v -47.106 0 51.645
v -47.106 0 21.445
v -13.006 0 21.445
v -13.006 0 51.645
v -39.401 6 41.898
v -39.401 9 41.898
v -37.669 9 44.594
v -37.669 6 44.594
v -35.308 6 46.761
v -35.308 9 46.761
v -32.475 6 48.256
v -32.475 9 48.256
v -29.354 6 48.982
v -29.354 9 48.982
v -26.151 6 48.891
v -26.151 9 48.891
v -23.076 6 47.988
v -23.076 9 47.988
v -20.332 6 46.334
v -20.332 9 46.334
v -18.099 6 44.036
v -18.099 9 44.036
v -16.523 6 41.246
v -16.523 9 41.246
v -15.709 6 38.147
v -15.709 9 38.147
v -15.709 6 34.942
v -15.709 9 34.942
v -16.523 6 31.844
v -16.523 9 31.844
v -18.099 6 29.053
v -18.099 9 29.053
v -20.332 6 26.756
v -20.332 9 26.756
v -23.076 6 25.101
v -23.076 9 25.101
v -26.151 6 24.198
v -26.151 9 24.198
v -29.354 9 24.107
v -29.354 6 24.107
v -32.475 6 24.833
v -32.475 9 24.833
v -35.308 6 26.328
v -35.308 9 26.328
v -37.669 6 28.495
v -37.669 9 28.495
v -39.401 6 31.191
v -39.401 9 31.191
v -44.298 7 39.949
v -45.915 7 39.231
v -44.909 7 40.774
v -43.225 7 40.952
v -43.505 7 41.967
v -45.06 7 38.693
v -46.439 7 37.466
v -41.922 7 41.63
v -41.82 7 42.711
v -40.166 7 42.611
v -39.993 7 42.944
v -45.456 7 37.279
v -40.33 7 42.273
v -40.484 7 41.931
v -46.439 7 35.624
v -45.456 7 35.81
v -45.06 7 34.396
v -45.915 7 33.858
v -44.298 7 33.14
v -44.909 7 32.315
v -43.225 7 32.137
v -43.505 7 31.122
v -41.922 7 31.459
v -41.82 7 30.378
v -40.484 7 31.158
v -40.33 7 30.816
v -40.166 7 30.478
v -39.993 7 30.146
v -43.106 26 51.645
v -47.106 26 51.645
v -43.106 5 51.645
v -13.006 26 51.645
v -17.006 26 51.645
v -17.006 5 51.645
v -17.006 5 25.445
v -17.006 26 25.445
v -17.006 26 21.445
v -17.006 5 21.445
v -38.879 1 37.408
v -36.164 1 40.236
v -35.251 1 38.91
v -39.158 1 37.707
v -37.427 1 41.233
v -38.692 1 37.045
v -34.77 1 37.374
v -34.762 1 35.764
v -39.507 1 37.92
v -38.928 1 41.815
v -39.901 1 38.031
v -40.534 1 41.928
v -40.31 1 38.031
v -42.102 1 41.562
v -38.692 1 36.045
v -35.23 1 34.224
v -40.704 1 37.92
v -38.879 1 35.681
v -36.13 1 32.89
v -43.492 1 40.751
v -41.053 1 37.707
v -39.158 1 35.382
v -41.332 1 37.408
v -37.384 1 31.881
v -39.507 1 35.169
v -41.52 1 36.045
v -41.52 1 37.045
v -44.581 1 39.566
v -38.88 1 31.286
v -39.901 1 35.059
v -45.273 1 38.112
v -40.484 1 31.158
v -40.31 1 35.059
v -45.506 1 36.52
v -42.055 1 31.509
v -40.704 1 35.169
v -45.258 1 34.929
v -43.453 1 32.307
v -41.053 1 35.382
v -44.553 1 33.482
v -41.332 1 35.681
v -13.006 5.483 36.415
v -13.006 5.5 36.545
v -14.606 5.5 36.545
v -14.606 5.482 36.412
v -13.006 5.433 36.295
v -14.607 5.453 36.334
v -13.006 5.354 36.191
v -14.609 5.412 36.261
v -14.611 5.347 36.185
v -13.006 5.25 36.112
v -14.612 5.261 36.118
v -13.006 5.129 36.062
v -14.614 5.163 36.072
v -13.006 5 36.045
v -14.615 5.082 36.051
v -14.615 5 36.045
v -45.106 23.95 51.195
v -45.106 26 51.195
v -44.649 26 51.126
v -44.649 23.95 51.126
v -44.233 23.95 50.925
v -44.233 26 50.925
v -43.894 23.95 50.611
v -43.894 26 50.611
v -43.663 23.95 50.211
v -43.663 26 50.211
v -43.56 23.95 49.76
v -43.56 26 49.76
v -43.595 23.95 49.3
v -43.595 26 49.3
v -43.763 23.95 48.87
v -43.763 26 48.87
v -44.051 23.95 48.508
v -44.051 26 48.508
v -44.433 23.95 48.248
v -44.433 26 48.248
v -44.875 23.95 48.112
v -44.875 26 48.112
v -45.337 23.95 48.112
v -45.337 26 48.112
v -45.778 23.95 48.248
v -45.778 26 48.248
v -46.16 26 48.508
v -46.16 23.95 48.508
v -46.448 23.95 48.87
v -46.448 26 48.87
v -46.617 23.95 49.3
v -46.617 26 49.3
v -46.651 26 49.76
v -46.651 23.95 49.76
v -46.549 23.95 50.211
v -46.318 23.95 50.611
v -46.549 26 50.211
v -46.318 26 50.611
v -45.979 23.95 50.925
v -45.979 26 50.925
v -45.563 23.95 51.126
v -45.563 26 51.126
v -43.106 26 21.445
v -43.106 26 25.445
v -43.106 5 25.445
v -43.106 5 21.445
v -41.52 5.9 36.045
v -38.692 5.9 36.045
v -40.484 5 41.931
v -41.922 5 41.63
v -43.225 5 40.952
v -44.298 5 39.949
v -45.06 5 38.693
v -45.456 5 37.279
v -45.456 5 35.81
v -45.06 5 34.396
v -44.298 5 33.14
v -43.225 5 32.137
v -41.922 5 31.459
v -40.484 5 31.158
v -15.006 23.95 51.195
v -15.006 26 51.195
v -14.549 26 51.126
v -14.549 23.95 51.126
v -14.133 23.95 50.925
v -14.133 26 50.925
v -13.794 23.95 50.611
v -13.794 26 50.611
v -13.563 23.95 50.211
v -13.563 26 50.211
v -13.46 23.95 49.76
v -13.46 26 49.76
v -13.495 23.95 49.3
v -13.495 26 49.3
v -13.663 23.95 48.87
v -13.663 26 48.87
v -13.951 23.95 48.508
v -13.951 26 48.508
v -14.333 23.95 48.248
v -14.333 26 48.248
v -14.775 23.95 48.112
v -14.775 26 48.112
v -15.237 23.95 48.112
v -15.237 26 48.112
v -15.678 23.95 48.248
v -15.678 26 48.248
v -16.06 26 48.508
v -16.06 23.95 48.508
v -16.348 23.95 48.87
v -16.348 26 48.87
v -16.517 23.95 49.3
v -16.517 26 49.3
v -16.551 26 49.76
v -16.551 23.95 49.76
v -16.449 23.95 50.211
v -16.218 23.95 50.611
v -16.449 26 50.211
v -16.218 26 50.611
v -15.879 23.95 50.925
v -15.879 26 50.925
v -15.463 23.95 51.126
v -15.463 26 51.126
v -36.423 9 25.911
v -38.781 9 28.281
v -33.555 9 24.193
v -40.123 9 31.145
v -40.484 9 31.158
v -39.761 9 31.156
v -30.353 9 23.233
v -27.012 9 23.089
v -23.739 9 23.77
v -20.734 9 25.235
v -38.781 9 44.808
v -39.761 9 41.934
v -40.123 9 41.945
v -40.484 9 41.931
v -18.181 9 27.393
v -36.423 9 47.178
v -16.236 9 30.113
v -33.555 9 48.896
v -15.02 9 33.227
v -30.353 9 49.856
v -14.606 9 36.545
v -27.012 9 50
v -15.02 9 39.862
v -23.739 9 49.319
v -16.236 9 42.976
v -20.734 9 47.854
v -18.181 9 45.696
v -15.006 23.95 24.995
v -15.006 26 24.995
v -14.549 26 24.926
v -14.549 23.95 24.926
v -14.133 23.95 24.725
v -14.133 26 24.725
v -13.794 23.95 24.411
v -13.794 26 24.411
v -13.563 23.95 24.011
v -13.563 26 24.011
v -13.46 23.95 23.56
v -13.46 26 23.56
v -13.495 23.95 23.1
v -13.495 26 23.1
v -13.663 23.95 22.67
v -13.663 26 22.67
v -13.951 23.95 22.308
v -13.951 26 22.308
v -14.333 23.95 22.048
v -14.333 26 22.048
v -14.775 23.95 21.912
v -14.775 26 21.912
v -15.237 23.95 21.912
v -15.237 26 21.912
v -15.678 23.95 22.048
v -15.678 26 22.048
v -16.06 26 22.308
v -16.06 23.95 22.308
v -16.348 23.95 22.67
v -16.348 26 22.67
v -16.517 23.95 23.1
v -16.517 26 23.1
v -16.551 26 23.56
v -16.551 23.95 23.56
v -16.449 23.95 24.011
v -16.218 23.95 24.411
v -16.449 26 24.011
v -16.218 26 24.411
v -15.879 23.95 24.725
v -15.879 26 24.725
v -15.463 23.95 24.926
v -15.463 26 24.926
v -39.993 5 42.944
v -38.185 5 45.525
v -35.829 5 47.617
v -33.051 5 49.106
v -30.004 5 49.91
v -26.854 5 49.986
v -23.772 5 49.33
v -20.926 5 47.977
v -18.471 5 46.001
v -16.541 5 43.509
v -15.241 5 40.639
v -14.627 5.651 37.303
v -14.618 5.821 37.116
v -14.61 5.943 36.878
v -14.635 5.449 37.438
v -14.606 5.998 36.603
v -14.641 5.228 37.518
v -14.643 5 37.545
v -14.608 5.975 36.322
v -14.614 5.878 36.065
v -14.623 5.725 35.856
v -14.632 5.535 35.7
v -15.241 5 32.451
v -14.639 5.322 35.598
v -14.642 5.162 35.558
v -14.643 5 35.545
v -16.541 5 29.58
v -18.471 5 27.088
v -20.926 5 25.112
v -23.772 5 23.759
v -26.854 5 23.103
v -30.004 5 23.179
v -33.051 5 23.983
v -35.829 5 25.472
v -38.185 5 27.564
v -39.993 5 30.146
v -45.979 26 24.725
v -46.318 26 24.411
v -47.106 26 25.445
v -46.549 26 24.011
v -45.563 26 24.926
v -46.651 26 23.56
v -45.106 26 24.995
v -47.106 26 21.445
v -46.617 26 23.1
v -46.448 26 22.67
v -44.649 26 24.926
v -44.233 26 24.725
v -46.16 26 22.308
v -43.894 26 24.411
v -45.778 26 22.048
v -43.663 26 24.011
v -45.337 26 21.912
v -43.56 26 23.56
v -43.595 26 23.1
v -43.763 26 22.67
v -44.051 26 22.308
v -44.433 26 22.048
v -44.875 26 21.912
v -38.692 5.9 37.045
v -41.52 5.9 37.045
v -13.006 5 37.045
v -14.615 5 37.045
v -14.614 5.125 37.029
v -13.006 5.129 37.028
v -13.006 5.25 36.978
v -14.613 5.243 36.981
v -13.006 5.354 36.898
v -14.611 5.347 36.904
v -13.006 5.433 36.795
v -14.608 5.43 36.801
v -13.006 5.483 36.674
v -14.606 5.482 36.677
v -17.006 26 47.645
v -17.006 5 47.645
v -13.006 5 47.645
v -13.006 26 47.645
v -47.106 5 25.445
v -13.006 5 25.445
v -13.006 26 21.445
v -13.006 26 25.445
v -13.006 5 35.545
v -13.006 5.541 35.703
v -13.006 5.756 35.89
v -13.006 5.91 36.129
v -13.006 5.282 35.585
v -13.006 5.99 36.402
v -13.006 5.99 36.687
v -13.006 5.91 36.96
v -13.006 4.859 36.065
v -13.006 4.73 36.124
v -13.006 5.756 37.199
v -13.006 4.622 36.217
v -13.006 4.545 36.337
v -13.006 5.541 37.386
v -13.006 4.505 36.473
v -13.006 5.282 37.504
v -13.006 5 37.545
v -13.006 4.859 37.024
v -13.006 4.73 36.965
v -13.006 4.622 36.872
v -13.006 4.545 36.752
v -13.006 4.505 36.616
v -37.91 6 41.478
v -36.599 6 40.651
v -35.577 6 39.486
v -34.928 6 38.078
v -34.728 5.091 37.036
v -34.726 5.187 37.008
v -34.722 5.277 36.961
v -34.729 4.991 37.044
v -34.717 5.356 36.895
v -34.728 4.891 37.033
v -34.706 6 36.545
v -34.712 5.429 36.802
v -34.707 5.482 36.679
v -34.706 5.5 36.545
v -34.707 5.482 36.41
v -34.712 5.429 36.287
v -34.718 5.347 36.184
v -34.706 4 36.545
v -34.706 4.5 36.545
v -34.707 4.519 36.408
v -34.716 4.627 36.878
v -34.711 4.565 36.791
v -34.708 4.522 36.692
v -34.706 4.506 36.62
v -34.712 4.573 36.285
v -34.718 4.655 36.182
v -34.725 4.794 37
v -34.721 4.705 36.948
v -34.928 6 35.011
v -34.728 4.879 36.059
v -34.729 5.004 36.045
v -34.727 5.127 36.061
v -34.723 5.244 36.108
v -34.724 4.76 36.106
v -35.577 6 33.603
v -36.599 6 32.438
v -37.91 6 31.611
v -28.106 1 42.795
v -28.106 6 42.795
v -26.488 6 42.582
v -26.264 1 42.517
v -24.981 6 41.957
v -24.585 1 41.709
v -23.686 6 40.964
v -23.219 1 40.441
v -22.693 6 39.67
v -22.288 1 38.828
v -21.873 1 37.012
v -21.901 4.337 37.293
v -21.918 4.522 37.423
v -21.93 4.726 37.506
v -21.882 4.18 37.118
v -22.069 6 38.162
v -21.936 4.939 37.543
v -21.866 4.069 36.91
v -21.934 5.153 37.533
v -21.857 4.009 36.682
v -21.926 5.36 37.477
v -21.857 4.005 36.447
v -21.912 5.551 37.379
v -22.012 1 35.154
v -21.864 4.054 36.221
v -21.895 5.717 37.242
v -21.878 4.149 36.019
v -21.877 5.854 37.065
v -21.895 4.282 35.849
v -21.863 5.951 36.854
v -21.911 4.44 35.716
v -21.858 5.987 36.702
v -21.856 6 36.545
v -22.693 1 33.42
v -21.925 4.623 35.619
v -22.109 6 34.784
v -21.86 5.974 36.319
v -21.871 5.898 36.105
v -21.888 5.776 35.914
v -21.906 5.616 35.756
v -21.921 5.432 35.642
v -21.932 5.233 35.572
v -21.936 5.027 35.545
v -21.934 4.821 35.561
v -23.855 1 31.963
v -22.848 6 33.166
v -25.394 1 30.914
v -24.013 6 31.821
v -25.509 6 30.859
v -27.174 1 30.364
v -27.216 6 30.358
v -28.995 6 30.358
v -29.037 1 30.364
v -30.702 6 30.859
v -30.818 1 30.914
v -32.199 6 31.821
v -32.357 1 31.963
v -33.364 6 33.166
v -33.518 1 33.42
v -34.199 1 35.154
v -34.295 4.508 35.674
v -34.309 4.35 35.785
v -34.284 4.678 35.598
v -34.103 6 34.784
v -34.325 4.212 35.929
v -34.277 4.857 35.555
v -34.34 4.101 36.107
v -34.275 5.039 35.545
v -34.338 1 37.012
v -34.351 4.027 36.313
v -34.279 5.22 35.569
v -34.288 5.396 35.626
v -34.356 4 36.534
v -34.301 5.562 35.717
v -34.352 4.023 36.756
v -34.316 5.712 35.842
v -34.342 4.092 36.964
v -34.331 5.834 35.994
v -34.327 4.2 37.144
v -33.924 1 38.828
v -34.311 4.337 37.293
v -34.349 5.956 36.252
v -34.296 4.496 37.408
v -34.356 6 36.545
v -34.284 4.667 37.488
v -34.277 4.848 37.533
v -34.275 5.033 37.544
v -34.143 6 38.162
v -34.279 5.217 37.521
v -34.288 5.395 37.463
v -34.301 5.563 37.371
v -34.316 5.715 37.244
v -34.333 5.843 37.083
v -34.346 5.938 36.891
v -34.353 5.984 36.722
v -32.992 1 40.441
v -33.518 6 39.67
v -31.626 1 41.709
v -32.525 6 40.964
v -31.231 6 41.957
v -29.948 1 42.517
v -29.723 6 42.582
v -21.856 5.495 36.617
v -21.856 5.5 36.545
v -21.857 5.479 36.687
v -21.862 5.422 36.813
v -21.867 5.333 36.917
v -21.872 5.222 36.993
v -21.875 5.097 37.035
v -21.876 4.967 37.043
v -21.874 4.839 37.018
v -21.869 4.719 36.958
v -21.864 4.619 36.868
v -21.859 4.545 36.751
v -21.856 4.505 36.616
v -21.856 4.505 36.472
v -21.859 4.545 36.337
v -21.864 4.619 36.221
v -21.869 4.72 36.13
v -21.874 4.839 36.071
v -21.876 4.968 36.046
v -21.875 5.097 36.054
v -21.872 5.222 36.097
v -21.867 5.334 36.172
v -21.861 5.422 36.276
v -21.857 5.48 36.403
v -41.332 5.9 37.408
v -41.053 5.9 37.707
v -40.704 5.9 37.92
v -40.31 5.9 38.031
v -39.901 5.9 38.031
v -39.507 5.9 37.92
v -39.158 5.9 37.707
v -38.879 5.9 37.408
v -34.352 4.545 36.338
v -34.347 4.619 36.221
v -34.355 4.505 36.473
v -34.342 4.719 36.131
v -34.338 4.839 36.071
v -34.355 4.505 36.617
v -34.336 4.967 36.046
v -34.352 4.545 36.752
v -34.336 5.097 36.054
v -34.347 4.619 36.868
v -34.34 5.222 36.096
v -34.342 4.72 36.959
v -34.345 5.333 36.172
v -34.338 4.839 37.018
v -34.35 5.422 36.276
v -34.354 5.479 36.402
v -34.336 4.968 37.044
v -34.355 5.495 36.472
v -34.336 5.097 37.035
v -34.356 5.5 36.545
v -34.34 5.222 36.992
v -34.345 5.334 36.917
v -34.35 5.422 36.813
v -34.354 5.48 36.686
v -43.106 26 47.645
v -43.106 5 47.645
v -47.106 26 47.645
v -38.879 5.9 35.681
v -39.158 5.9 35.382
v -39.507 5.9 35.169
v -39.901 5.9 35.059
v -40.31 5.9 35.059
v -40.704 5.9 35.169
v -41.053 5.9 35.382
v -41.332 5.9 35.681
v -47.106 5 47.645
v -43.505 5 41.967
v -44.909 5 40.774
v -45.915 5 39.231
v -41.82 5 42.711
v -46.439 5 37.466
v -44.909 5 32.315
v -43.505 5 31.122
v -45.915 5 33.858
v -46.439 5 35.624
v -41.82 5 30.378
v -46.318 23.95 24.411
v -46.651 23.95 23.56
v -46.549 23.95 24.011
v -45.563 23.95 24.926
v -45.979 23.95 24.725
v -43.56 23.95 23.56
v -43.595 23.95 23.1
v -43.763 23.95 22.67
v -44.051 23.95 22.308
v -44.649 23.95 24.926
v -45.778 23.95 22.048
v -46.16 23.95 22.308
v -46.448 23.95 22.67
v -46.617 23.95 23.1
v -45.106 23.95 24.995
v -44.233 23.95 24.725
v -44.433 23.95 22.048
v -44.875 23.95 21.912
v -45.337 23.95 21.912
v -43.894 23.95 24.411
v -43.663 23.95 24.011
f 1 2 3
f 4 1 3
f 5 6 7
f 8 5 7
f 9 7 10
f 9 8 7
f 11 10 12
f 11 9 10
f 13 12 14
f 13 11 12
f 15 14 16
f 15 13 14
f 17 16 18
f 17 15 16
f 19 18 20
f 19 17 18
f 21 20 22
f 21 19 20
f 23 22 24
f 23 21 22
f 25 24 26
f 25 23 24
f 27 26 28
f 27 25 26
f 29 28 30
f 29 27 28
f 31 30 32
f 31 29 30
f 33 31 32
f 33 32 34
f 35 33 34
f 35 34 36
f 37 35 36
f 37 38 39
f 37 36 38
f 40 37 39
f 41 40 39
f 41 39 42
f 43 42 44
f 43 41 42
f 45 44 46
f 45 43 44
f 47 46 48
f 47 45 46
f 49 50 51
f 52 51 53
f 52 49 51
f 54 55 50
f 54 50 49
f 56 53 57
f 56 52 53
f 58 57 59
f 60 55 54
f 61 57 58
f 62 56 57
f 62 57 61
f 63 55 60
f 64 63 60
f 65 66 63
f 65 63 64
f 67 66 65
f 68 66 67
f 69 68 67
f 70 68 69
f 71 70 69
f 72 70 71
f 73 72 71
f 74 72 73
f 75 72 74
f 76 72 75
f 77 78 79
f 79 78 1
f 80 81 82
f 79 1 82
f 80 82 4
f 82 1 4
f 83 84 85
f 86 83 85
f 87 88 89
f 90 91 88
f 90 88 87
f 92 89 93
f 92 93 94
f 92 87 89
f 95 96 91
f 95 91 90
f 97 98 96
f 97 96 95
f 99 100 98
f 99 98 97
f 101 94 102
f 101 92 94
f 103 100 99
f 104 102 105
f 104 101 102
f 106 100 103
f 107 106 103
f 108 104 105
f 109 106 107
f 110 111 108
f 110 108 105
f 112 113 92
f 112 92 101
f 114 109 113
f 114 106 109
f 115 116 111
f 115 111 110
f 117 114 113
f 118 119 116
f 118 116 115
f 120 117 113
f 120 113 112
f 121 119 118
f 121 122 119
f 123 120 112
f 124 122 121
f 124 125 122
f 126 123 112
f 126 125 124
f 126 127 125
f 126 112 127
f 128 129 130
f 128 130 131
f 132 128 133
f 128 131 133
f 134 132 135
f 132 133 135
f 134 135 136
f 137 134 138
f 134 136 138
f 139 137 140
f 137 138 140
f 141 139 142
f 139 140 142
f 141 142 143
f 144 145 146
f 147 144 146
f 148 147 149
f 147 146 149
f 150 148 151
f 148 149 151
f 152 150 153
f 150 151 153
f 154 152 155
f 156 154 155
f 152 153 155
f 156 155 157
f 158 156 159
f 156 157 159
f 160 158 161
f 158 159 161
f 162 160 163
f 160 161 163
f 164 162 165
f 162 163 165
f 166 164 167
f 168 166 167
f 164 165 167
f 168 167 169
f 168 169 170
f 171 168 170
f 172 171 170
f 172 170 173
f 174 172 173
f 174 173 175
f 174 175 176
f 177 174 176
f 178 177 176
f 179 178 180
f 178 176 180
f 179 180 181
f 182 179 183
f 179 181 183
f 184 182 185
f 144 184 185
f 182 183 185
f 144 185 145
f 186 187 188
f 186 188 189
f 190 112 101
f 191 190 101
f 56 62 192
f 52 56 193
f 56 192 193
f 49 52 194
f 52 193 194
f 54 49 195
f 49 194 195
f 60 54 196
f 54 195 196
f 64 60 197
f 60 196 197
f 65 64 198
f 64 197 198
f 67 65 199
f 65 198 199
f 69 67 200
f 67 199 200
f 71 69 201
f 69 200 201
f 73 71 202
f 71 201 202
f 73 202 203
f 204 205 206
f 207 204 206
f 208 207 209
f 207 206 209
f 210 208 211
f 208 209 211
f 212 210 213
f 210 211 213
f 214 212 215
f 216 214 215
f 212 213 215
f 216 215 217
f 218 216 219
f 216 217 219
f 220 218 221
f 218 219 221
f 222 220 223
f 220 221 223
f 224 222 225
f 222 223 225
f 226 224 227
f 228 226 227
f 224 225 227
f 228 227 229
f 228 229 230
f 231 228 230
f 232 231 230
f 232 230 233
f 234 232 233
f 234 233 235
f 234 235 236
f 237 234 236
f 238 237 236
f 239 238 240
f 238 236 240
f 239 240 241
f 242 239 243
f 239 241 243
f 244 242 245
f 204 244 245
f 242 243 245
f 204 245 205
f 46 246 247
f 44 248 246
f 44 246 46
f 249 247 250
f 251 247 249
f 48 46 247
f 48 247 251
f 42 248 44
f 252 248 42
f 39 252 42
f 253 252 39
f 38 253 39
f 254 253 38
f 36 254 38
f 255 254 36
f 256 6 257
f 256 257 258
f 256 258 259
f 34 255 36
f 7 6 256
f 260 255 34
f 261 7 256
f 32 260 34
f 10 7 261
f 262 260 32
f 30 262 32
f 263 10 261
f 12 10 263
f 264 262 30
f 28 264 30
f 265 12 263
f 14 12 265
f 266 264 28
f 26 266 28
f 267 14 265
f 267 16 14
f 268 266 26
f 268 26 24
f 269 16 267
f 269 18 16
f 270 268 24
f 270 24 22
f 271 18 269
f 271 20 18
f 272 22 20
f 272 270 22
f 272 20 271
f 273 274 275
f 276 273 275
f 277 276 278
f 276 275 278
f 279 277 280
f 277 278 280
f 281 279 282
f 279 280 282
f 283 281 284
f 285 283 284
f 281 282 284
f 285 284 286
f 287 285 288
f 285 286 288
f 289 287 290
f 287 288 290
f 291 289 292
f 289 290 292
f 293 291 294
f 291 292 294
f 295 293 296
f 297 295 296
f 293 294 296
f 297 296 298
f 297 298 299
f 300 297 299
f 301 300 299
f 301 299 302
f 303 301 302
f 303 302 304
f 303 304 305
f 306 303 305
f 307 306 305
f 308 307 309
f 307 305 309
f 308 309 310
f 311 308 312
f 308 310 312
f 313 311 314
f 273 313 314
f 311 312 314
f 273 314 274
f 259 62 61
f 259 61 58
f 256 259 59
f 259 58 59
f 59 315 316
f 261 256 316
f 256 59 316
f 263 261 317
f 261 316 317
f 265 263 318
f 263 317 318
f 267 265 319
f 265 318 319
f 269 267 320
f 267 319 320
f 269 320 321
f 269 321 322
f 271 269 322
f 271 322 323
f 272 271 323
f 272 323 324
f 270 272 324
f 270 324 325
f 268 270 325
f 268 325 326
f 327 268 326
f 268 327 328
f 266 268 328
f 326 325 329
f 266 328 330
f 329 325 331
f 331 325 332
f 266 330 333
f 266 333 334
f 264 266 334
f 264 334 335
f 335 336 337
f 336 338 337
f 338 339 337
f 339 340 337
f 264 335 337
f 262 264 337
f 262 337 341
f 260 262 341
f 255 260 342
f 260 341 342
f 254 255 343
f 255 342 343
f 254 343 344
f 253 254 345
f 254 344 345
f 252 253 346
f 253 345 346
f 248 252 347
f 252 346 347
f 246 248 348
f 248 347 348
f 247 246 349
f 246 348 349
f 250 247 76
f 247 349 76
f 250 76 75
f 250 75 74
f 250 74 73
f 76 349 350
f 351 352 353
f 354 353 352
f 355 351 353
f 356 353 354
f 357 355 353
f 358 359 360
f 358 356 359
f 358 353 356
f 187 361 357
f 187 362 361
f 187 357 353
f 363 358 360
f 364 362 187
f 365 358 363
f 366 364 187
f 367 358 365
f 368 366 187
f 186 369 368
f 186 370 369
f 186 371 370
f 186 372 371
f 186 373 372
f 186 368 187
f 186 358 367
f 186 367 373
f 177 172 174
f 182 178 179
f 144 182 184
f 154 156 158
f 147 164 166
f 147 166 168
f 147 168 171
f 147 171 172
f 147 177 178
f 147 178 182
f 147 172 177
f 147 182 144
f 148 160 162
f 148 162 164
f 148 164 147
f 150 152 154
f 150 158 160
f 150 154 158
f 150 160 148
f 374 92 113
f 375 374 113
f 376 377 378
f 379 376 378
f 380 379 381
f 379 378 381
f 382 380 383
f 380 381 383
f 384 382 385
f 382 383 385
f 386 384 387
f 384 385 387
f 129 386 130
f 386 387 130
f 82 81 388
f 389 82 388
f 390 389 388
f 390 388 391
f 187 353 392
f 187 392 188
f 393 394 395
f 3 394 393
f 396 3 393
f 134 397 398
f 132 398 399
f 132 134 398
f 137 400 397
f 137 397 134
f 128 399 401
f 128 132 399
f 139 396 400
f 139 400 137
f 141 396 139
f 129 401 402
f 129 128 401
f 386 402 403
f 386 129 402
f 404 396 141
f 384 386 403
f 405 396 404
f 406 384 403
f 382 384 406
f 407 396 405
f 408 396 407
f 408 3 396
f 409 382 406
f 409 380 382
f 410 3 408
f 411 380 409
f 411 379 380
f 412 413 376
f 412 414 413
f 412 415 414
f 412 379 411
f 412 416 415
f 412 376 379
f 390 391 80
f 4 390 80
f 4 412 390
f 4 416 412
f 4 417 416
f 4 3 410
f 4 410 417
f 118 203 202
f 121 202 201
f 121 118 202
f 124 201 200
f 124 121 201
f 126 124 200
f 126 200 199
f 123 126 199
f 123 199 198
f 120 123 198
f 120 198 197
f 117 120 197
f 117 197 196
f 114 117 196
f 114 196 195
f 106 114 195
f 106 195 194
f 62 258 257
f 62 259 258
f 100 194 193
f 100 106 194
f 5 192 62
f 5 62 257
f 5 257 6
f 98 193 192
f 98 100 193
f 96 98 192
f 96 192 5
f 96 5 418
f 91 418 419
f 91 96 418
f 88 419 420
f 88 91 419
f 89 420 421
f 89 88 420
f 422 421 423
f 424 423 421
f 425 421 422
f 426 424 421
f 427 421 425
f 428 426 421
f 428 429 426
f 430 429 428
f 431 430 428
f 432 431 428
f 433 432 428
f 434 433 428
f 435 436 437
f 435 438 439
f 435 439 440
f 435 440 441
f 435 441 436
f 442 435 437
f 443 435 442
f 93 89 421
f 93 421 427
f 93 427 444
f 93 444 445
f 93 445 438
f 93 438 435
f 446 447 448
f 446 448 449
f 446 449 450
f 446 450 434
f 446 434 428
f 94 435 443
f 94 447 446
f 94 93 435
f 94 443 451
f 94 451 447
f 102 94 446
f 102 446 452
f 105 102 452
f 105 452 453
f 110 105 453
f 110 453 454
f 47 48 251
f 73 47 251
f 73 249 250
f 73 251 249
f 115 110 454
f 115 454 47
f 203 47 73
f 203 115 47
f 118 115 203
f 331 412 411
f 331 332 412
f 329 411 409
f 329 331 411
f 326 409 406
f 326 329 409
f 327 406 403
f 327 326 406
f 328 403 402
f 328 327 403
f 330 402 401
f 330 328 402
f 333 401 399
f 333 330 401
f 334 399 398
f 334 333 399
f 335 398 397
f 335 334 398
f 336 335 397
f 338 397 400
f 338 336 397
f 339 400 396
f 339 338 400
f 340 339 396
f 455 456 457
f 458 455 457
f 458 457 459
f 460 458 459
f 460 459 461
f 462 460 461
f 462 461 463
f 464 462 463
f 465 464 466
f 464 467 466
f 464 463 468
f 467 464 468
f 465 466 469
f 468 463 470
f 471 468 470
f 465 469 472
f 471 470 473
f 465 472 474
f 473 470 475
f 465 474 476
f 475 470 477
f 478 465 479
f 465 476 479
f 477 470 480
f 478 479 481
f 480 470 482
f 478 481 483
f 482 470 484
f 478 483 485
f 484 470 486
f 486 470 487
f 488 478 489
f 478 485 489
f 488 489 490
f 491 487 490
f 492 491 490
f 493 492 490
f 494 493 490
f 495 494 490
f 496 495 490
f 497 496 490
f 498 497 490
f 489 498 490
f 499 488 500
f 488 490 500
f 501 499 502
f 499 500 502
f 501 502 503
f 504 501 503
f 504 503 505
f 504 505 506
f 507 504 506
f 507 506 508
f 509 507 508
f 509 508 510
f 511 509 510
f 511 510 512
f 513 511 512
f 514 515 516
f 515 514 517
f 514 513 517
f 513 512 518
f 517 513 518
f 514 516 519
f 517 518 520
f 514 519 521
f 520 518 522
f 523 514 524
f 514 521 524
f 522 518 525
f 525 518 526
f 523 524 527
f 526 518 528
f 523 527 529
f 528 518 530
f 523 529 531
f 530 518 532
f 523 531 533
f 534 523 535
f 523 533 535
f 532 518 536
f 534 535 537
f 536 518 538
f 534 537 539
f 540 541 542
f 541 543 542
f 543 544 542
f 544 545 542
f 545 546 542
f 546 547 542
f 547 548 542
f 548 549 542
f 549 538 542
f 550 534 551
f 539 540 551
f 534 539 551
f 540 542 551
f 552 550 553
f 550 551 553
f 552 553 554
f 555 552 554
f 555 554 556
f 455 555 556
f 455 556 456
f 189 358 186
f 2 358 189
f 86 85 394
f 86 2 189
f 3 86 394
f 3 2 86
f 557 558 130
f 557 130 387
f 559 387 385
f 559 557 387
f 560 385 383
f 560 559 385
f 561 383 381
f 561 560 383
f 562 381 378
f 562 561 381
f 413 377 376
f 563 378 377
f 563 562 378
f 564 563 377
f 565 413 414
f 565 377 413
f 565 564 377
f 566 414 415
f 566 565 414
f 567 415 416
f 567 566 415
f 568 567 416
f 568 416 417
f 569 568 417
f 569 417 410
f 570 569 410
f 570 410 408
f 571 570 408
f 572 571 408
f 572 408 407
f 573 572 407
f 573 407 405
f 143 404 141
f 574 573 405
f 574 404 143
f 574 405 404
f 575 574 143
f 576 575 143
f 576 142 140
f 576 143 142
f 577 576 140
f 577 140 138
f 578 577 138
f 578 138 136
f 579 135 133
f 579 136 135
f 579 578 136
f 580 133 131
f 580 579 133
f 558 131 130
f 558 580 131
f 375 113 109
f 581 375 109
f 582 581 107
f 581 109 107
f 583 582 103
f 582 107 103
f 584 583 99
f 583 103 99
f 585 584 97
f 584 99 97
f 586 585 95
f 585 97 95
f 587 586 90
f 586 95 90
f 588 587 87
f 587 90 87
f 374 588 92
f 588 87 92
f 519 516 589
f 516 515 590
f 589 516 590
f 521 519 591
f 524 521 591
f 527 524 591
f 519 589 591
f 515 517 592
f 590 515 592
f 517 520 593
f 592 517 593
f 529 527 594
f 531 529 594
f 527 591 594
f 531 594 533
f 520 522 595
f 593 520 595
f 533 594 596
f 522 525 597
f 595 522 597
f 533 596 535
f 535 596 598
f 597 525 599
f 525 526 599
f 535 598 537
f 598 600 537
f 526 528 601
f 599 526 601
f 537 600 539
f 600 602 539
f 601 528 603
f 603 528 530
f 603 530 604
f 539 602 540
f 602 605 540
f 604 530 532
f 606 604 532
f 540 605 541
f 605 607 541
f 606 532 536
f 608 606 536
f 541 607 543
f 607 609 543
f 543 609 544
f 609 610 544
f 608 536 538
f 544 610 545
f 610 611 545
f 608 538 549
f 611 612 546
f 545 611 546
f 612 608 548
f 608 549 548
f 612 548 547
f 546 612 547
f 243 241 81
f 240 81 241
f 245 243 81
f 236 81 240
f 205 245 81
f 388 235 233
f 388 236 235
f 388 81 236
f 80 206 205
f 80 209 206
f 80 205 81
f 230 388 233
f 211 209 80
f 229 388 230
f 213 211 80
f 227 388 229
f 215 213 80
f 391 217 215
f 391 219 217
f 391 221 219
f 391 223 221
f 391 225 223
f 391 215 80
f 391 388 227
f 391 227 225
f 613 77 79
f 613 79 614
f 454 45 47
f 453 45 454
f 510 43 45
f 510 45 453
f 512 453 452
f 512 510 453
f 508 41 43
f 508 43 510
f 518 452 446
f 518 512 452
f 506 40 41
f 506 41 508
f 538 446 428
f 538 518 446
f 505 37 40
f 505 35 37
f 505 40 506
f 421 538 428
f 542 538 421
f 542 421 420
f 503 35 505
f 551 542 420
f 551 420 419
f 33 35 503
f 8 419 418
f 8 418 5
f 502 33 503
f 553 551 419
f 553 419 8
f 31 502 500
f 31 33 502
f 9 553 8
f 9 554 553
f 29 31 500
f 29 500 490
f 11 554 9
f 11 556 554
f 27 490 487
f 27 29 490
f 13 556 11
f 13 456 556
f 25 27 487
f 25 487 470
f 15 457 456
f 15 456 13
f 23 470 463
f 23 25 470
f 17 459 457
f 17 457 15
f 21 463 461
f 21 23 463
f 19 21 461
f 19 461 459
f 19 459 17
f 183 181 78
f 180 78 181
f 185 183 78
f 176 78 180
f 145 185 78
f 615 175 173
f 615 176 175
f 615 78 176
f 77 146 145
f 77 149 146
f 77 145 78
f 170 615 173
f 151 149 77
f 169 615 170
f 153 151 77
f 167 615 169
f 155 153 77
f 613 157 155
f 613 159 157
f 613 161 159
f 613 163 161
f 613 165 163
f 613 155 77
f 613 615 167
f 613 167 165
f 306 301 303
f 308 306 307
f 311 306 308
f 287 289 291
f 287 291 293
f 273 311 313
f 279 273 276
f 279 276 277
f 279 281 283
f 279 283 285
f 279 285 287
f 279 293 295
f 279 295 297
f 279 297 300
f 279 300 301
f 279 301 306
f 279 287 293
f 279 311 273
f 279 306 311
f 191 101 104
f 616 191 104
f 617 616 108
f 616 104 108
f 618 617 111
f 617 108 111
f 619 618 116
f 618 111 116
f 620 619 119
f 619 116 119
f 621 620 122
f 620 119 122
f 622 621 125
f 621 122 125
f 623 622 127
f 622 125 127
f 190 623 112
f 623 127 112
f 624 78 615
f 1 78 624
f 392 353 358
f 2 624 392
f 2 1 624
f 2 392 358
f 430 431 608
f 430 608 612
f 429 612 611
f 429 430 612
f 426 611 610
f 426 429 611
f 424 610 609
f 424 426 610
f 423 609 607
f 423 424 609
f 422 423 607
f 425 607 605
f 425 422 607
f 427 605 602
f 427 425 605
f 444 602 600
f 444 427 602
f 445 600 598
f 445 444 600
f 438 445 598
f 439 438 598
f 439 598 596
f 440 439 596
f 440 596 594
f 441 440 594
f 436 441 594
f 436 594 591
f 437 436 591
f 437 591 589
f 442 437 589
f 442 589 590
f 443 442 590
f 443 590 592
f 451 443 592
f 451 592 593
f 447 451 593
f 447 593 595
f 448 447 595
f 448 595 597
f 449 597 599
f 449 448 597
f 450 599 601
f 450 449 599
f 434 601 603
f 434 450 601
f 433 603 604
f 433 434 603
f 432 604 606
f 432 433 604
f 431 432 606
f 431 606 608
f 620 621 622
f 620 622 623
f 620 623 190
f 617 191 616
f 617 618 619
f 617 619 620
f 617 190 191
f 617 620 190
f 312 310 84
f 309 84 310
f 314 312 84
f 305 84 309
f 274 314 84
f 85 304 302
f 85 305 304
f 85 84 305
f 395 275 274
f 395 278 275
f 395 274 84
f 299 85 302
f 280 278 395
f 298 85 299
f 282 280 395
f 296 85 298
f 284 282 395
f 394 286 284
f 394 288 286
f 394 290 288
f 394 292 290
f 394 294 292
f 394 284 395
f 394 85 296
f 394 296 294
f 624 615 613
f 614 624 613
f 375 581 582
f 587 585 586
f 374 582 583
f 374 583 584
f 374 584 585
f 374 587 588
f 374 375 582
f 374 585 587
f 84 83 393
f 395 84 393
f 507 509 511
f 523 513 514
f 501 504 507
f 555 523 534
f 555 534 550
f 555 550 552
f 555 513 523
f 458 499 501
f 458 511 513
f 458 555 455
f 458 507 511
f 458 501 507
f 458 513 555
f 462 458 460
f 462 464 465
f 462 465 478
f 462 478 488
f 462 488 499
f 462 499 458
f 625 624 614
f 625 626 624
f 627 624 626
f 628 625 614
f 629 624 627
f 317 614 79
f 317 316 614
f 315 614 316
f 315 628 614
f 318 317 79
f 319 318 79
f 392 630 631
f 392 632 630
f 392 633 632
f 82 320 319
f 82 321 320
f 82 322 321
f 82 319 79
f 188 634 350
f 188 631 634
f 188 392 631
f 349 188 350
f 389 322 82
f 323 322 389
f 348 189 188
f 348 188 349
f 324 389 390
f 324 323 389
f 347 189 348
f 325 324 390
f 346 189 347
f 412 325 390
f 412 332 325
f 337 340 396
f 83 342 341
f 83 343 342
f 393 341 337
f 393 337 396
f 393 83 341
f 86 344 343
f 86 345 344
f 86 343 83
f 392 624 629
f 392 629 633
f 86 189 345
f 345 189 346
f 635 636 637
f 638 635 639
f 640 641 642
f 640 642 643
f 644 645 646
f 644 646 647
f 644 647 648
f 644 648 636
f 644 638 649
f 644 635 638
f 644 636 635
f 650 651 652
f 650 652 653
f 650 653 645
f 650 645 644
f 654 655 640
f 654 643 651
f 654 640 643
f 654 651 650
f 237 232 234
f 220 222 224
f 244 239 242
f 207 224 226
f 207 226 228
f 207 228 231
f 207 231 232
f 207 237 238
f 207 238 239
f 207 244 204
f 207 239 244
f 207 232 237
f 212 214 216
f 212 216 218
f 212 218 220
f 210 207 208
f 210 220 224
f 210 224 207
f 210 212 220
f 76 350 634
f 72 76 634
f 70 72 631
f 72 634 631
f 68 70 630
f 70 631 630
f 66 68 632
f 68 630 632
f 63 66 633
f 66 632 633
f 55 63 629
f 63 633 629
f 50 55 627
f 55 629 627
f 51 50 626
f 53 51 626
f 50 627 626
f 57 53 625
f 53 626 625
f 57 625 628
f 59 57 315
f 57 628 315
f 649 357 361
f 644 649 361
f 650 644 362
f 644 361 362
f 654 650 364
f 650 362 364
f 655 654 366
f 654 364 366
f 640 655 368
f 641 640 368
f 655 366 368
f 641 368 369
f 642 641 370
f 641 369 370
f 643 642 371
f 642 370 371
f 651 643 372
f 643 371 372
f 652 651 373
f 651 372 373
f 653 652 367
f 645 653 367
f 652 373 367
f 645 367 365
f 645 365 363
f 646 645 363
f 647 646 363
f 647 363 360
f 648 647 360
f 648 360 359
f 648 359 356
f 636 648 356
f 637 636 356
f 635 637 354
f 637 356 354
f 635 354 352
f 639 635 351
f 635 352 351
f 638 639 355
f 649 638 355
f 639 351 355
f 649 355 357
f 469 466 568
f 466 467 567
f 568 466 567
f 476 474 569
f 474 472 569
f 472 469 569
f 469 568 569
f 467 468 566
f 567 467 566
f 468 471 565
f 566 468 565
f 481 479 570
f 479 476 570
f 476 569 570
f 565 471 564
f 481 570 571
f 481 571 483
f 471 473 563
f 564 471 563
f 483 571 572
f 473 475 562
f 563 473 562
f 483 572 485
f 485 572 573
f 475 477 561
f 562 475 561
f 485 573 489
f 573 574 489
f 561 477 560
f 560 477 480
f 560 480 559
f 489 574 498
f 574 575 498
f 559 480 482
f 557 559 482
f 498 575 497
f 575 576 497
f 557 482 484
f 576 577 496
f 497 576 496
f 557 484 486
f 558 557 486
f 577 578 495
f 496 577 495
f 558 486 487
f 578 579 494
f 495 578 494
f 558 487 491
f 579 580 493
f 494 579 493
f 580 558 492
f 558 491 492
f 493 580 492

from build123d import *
from build123d.topology import SkipClean

# Parameters (mm, degrees)
SKETCH1_W               = 34.1
SKETCH1_H               = 30.2
BOSS_EXTRUDE1_DEPTH     = 5
SKETCH2_R               = 13.5
BOSS_EXTRUDE2_DEPTH     = 1
SKETCH3_R               = 13.5
SKETCH3_R_2             = 12.5
BOSS_EXTRUDE3_DEPTH     = 3
SKETCH4_R               = 6.25
CUT_EXTRUDE2_DEPTH      = 5
CUT_EXTRUDE3_DEPTH      = 5
CUT_EXTRUDE3_DEPTH_BACK = 5
SKETCH6_R               = 5.4
BOSS_EXTRUDE4_DEPTH     = 2
BOSS_EXTRUDE5_DEPTH     = 4.9
SKETCH10_R              = 1
SKETCH10_R_2            = 0.5
CUT_SWEEP1_START        = -34.728938274
CUT_SWEEP1_OUTLINE_R    = 0.5
CUT_SWEEP1_DEPTH        = 21.723198077
CUT_EXTRUDE4_START      = 5
SKETCH13_R              = 6.25
CUT_EXTRUDE4_DEPTH      = 5
SKETCH14_W              = 4
SKETCH14_H              = 4
BOSS_EXTRUDE6_DEPTH     = 21
SKETCH15_R              = 1.55
CUT_EXTRUDE5_DEPTH      = 2.05


# Read off the part's stored shape, not the designer's step: Cut-Sweep1
with BuildPart() as part:
    # Sketch1 → Boss-Extrude1 (new body)
    with BuildSketch(Plane(origin=(0, 0, 0), x_dir=(1, 0, 0), z_dir=(0, 1, 0))):
        with Locations((-30.055740197, -36.544574539)):
            Rectangle(SKETCH1_W, SKETCH1_H)
    extrude(amount=BOSS_EXTRUDE1_DEPTH)

    # Sketch2 → Boss-Extrude2 (add)
    with BuildSketch(Plane(origin=(0, 5, 0), x_dir=(1, 0, 0), z_dir=(0, 1, 0))):
        with Locations(Location((-28.105740197, -36.544574539, 0), (0, 0, 270))):
            Circle(SKETCH2_R)
    extrude(amount=BOSS_EXTRUDE2_DEPTH)

    # Sketch3 → Boss-Extrude3 (add)
    with BuildSketch(Plane(origin=(0, 6, 0), x_dir=(1, 0, 0), z_dir=(0, 1, 0))):
        with Locations(Location((-28.105740197, -36.544574539, 0), (0, 0, 270))):
            Circle(SKETCH3_R)
        with Locations(Location((-28.105740197, -36.544574539, 0), (0, 0, 270))):
            Circle(SKETCH3_R_2, mode=Mode.SUBTRACT)
    extrude(amount=BOSS_EXTRUDE3_DEPTH)

    # Sketch4 → Cut-Extrude2 (cut)
    with BuildSketch(Plane(origin=(0, 6, 0), x_dir=(1, 0, 0), z_dir=(0, 1, 0))):
        with Locations(Location((-28.105740197, -36.544574539, 0), (0, 0, 270))):
            Circle(SKETCH4_R)
    extrude(amount=-CUT_EXTRUDE2_DEPTH, mode=Mode.SUBTRACT)

    # Sketch6 → Cut-Extrude3 (cut, two sides: drawn at the far end of the back side and taken through both)
    with BuildSketch(Plane(origin=(0, 6, 0), x_dir=(1, 0, 0), z_dir=(0, 1, 0)).offset(-CUT_EXTRUDE3_DEPTH_BACK)):
        with Locations(Location((-40.105740197, -36.544574539, 0), (0, 0, 94.021964573))):
            Circle(SKETCH6_R)
    extrude(amount=CUT_EXTRUDE3_DEPTH + CUT_EXTRUDE3_DEPTH_BACK, mode=Mode.SUBTRACT)

    # Sketch7 → Boss-Extrude4 (add)
    with BuildSketch(Plane(origin=(0, 5, 0), x_dir=(1, 0, 0), z_dir=(0, 1, 0))):
        with BuildLine():
            ThreePointArc((-40.484490197, -41.931275611), (-45.505740197, -36.544574539), (-40.484490197, -31.157873467))
            ThreePointArc((-40.484490197, -31.157873467), (-40.249209884, -30.646596585), (-39.99282353, -30.145570724))
            ThreePointArc((-39.99282353, -30.145570724), (-46.505740197, -36.544574539), (-39.99282353, -42.943578354))
            ThreePointArc((-39.99282353, -42.943578354), (-40.249209884, -42.442552493), (-40.484490197, -41.931275611))
        make_face()
    extrude(amount=BOSS_EXTRUDE4_DEPTH)

    # Sketch9 → Boss-Extrude5 (add)
    with BuildSketch(Plane(origin=(0, 1, 0), x_dir=(1, 0, 0), z_dir=(0, 1, 0))):
        with BuildLine():
            Line((-38.691526635, -37.044574539), (-41.519953759, -37.044574539))
            ThreePointArc((-41.519953759, -37.044574539), (-40.105740197, -38.044574539), (-38.691526635, -37.044574539))
        make_face()
        with BuildLine():
            ThreePointArc((-38.691526635, -36.044574539), (-40.105740197, -35.044574539), (-41.519953759, -36.044574539))
            Line((-41.519953759, -36.044574539), (-38.691526635, -36.044574539))
        make_face()
    extrude(amount=BOSS_EXTRUDE5_DEPTH)

    # Sweep1: sweep along a path in Sketch11
    with BuildLine(Plane(origin=(0, 5, 0), x_dir=(1, 0, 0), z_dir=(0, 1, 0))) as sweep1_path:
        Line((-13.005740197, -36.544574539), (-34.705740197, -36.544574539))
    # Sketch10 → Sweep1 (sweep)
    with BuildSketch(Plane(origin=(-13.005740197, 0, 0), x_dir=(0, 0, -1), z_dir=(1, 0, 0))):
        with Locations((-36.544574539, 5)):
            Circle(SKETCH10_R)
        with Locations((-36.544574539, 5)):
            Circle(SKETCH10_R_2, mode=Mode.SUBTRACT)
    sweep(path=sweep1_path.line)

    # Cut-Sweep1 outline → Cut-Sweep1 (cut)
    with SkipClean():  # the faces are left unmerged after this step: merging them gives an invalid solid
        with BuildSketch(Plane.YZ.offset(CUT_SWEEP1_START)):
            with Locations((5, 36.544574539)):
                Circle(CUT_SWEEP1_OUTLINE_R)
        extrude(amount=CUT_SWEEP1_DEPTH, mode=Mode.SUBTRACT)
    add(part.part.scale(1), mode=Mode.REPLACE)  # the faces are merged on a copy

    # Sketch13 → Cut-Extrude4 (cut)
    with BuildSketch(Plane(origin=(0, 1, 0), x_dir=(1, 0, 0), z_dir=(0, 1, 0)).offset(CUT_EXTRUDE4_START)):
        with Locations(Location((-28.105740197, -36.544574539, 0), (0, 0, 270))):
            Circle(SKETCH13_R)
    extrude(amount=-CUT_EXTRUDE4_DEPTH, mode=Mode.SUBTRACT)

    # Sketch14 → Boss-Extrude6 (add)
    with BuildSketch(Plane(origin=(0, 5, 0), x_dir=(1, 0, 0), z_dir=(0, 1, 0))):
        with Locations((-45.105740197, -23.444574539)):
            Rectangle(SKETCH14_W, SKETCH14_H)
        with Locations((-45.105740197, -49.644574539)):
            Rectangle(SKETCH14_W, SKETCH14_H)
        with Locations((-15.005740197, -49.644574539)):
            Rectangle(SKETCH14_W, SKETCH14_H)
        with Locations((-15.005740197, -23.444574539)):
            Rectangle(SKETCH14_W, SKETCH14_H)
    extrude(amount=BOSS_EXTRUDE6_DEPTH)

    # Sketch15 → Cut-Extrude5 (cut)
    with BuildSketch(Plane(origin=(0, 26, 0), x_dir=(1, 0, 0), z_dir=(0, 1, 0))):
        with Locations(Location((-45.105740197, -49.644574539, 0), (0, 0, 270))):
            Circle(SKETCH15_R)
        with Locations(Location((-45.105740197, -23.444574539, 0), (0, 0, 270))):
            Circle(SKETCH15_R)
        with Locations(Location((-15.005740197, -23.444574539, 0), (0, 0, 270))):
            Circle(SKETCH15_R)
        with Locations(Location((-15.005740197, -49.644574539, 0), (0, 0, 270))):
            Circle(SKETCH15_R)
    extrude(amount=-CUT_EXTRUDE5_DEPTH, mode=Mode.SUBTRACT)


solid = part.part
